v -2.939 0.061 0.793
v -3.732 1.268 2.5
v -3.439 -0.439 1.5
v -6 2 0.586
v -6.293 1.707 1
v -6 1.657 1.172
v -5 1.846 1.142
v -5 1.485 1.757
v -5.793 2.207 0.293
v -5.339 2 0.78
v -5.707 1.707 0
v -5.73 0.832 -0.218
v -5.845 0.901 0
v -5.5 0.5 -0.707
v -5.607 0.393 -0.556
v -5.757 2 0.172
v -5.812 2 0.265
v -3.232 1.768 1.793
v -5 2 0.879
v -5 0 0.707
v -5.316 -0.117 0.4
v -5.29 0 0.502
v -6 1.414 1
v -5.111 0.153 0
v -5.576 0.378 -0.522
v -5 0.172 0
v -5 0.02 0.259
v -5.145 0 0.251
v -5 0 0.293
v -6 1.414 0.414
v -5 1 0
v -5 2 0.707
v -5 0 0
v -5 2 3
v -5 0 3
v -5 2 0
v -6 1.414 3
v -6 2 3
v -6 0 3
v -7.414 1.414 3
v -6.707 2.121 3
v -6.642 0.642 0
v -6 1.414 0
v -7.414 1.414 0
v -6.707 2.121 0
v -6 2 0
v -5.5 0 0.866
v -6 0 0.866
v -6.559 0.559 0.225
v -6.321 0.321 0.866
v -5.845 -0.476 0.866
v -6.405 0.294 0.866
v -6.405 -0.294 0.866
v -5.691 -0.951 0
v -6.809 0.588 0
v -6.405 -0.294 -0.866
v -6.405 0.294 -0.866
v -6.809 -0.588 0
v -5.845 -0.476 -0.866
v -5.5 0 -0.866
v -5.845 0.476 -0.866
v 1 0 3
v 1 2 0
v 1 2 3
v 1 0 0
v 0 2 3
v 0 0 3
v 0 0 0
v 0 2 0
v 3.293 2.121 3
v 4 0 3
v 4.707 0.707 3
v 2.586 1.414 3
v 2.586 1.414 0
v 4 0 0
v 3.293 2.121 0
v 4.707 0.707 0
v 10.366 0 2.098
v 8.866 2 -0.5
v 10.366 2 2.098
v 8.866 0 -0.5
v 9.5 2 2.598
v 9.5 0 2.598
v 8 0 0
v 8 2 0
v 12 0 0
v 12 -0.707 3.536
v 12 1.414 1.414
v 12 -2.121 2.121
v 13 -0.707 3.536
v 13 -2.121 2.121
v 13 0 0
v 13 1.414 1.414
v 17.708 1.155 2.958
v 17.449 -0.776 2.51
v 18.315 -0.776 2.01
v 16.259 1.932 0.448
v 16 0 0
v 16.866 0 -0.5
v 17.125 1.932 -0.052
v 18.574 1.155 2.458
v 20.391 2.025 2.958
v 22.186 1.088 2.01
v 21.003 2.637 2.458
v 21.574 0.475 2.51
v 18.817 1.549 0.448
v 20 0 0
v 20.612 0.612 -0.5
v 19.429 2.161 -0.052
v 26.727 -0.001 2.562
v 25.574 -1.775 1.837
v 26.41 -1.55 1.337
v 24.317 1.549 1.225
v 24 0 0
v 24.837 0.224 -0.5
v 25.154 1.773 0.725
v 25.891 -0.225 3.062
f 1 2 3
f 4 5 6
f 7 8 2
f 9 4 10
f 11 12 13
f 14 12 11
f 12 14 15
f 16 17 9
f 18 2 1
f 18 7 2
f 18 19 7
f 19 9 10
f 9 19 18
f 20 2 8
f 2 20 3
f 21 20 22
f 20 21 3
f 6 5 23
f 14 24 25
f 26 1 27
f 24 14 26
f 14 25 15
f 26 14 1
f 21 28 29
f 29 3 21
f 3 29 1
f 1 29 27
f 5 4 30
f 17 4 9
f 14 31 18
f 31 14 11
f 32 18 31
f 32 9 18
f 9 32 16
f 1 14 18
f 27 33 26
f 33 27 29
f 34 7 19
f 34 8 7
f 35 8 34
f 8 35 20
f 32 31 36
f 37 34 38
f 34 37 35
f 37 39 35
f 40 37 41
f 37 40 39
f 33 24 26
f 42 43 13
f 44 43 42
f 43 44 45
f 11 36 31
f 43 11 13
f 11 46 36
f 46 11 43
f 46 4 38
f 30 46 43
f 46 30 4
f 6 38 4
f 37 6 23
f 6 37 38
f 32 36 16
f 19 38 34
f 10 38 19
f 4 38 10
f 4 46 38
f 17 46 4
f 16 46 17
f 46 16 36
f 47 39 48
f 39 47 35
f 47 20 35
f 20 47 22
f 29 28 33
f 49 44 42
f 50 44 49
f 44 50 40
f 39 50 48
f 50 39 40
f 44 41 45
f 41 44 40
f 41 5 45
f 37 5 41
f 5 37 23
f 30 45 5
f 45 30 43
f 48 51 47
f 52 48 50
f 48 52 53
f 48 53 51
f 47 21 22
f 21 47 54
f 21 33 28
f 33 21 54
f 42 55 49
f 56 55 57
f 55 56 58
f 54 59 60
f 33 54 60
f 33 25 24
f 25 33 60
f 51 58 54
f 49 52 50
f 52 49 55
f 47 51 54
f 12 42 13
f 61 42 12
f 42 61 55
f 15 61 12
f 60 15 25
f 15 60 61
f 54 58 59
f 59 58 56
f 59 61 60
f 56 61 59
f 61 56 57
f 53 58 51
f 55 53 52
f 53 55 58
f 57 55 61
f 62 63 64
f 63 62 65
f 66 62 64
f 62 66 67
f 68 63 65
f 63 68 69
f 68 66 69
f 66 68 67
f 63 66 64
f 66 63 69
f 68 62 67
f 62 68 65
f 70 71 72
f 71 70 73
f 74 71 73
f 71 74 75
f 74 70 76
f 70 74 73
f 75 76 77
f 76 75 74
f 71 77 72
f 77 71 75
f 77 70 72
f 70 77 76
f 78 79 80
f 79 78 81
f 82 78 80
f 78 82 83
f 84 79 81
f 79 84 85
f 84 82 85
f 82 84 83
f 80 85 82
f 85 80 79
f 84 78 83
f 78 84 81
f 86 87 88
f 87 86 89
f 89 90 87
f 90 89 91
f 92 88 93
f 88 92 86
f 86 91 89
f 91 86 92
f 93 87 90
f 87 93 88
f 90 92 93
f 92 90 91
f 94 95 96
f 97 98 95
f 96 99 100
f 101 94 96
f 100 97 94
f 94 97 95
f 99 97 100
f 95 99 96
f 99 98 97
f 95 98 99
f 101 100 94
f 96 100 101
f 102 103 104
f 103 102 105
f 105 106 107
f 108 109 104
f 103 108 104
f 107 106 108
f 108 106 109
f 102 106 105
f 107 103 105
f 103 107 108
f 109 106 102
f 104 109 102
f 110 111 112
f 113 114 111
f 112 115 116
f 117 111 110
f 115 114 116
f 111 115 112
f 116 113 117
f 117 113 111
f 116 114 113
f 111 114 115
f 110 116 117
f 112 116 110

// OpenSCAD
s=[1,2,3];
//Fine
translate([0,0,0])
rotate(0)
cube(s);

translate([4,0,0])
rotate(45)
cube(s);

translate([8,0,0])
rotate(30,[0,1,0])
cube(s);

translate([12,0,0])
rotate([45])
cube(s);

translate([16,0,0])
rotate([15,30])
cube(s);

translate([20,0,0])
rotate([15,30,45])
cube(s);

//Edges cases
translate([-12,0,0])
{
    rotate(undef)
    rotate() //same as undef
    rotate(1/0)
    rotate([1/0,1/0])
    rotate([])
    cube(s);
}

//when deg_a is an array, the 'v' argument is ignored
translate([24,0,0])
rotate([45,30,15],v=[0,0,0])
cube(s);

//Problems with the parameters
//We mainly care that this calls create a warning
color("red")
translate([-6,0,0])
{
    rotate([45,45,45,45])
    cube(s);

    rotate()
    cube(s);

    rotate("45")
    cube(s);

    rotate(45,[0,1,0,0])
    cube(s);
    
    rotate(v=[1,0,0])
    cube(s);
    
    rotate("a","v")
    sphere();

    rotate(v="v",a="a")
    sphere();

    rotate(["a"],["v"])
    sphere();
}
